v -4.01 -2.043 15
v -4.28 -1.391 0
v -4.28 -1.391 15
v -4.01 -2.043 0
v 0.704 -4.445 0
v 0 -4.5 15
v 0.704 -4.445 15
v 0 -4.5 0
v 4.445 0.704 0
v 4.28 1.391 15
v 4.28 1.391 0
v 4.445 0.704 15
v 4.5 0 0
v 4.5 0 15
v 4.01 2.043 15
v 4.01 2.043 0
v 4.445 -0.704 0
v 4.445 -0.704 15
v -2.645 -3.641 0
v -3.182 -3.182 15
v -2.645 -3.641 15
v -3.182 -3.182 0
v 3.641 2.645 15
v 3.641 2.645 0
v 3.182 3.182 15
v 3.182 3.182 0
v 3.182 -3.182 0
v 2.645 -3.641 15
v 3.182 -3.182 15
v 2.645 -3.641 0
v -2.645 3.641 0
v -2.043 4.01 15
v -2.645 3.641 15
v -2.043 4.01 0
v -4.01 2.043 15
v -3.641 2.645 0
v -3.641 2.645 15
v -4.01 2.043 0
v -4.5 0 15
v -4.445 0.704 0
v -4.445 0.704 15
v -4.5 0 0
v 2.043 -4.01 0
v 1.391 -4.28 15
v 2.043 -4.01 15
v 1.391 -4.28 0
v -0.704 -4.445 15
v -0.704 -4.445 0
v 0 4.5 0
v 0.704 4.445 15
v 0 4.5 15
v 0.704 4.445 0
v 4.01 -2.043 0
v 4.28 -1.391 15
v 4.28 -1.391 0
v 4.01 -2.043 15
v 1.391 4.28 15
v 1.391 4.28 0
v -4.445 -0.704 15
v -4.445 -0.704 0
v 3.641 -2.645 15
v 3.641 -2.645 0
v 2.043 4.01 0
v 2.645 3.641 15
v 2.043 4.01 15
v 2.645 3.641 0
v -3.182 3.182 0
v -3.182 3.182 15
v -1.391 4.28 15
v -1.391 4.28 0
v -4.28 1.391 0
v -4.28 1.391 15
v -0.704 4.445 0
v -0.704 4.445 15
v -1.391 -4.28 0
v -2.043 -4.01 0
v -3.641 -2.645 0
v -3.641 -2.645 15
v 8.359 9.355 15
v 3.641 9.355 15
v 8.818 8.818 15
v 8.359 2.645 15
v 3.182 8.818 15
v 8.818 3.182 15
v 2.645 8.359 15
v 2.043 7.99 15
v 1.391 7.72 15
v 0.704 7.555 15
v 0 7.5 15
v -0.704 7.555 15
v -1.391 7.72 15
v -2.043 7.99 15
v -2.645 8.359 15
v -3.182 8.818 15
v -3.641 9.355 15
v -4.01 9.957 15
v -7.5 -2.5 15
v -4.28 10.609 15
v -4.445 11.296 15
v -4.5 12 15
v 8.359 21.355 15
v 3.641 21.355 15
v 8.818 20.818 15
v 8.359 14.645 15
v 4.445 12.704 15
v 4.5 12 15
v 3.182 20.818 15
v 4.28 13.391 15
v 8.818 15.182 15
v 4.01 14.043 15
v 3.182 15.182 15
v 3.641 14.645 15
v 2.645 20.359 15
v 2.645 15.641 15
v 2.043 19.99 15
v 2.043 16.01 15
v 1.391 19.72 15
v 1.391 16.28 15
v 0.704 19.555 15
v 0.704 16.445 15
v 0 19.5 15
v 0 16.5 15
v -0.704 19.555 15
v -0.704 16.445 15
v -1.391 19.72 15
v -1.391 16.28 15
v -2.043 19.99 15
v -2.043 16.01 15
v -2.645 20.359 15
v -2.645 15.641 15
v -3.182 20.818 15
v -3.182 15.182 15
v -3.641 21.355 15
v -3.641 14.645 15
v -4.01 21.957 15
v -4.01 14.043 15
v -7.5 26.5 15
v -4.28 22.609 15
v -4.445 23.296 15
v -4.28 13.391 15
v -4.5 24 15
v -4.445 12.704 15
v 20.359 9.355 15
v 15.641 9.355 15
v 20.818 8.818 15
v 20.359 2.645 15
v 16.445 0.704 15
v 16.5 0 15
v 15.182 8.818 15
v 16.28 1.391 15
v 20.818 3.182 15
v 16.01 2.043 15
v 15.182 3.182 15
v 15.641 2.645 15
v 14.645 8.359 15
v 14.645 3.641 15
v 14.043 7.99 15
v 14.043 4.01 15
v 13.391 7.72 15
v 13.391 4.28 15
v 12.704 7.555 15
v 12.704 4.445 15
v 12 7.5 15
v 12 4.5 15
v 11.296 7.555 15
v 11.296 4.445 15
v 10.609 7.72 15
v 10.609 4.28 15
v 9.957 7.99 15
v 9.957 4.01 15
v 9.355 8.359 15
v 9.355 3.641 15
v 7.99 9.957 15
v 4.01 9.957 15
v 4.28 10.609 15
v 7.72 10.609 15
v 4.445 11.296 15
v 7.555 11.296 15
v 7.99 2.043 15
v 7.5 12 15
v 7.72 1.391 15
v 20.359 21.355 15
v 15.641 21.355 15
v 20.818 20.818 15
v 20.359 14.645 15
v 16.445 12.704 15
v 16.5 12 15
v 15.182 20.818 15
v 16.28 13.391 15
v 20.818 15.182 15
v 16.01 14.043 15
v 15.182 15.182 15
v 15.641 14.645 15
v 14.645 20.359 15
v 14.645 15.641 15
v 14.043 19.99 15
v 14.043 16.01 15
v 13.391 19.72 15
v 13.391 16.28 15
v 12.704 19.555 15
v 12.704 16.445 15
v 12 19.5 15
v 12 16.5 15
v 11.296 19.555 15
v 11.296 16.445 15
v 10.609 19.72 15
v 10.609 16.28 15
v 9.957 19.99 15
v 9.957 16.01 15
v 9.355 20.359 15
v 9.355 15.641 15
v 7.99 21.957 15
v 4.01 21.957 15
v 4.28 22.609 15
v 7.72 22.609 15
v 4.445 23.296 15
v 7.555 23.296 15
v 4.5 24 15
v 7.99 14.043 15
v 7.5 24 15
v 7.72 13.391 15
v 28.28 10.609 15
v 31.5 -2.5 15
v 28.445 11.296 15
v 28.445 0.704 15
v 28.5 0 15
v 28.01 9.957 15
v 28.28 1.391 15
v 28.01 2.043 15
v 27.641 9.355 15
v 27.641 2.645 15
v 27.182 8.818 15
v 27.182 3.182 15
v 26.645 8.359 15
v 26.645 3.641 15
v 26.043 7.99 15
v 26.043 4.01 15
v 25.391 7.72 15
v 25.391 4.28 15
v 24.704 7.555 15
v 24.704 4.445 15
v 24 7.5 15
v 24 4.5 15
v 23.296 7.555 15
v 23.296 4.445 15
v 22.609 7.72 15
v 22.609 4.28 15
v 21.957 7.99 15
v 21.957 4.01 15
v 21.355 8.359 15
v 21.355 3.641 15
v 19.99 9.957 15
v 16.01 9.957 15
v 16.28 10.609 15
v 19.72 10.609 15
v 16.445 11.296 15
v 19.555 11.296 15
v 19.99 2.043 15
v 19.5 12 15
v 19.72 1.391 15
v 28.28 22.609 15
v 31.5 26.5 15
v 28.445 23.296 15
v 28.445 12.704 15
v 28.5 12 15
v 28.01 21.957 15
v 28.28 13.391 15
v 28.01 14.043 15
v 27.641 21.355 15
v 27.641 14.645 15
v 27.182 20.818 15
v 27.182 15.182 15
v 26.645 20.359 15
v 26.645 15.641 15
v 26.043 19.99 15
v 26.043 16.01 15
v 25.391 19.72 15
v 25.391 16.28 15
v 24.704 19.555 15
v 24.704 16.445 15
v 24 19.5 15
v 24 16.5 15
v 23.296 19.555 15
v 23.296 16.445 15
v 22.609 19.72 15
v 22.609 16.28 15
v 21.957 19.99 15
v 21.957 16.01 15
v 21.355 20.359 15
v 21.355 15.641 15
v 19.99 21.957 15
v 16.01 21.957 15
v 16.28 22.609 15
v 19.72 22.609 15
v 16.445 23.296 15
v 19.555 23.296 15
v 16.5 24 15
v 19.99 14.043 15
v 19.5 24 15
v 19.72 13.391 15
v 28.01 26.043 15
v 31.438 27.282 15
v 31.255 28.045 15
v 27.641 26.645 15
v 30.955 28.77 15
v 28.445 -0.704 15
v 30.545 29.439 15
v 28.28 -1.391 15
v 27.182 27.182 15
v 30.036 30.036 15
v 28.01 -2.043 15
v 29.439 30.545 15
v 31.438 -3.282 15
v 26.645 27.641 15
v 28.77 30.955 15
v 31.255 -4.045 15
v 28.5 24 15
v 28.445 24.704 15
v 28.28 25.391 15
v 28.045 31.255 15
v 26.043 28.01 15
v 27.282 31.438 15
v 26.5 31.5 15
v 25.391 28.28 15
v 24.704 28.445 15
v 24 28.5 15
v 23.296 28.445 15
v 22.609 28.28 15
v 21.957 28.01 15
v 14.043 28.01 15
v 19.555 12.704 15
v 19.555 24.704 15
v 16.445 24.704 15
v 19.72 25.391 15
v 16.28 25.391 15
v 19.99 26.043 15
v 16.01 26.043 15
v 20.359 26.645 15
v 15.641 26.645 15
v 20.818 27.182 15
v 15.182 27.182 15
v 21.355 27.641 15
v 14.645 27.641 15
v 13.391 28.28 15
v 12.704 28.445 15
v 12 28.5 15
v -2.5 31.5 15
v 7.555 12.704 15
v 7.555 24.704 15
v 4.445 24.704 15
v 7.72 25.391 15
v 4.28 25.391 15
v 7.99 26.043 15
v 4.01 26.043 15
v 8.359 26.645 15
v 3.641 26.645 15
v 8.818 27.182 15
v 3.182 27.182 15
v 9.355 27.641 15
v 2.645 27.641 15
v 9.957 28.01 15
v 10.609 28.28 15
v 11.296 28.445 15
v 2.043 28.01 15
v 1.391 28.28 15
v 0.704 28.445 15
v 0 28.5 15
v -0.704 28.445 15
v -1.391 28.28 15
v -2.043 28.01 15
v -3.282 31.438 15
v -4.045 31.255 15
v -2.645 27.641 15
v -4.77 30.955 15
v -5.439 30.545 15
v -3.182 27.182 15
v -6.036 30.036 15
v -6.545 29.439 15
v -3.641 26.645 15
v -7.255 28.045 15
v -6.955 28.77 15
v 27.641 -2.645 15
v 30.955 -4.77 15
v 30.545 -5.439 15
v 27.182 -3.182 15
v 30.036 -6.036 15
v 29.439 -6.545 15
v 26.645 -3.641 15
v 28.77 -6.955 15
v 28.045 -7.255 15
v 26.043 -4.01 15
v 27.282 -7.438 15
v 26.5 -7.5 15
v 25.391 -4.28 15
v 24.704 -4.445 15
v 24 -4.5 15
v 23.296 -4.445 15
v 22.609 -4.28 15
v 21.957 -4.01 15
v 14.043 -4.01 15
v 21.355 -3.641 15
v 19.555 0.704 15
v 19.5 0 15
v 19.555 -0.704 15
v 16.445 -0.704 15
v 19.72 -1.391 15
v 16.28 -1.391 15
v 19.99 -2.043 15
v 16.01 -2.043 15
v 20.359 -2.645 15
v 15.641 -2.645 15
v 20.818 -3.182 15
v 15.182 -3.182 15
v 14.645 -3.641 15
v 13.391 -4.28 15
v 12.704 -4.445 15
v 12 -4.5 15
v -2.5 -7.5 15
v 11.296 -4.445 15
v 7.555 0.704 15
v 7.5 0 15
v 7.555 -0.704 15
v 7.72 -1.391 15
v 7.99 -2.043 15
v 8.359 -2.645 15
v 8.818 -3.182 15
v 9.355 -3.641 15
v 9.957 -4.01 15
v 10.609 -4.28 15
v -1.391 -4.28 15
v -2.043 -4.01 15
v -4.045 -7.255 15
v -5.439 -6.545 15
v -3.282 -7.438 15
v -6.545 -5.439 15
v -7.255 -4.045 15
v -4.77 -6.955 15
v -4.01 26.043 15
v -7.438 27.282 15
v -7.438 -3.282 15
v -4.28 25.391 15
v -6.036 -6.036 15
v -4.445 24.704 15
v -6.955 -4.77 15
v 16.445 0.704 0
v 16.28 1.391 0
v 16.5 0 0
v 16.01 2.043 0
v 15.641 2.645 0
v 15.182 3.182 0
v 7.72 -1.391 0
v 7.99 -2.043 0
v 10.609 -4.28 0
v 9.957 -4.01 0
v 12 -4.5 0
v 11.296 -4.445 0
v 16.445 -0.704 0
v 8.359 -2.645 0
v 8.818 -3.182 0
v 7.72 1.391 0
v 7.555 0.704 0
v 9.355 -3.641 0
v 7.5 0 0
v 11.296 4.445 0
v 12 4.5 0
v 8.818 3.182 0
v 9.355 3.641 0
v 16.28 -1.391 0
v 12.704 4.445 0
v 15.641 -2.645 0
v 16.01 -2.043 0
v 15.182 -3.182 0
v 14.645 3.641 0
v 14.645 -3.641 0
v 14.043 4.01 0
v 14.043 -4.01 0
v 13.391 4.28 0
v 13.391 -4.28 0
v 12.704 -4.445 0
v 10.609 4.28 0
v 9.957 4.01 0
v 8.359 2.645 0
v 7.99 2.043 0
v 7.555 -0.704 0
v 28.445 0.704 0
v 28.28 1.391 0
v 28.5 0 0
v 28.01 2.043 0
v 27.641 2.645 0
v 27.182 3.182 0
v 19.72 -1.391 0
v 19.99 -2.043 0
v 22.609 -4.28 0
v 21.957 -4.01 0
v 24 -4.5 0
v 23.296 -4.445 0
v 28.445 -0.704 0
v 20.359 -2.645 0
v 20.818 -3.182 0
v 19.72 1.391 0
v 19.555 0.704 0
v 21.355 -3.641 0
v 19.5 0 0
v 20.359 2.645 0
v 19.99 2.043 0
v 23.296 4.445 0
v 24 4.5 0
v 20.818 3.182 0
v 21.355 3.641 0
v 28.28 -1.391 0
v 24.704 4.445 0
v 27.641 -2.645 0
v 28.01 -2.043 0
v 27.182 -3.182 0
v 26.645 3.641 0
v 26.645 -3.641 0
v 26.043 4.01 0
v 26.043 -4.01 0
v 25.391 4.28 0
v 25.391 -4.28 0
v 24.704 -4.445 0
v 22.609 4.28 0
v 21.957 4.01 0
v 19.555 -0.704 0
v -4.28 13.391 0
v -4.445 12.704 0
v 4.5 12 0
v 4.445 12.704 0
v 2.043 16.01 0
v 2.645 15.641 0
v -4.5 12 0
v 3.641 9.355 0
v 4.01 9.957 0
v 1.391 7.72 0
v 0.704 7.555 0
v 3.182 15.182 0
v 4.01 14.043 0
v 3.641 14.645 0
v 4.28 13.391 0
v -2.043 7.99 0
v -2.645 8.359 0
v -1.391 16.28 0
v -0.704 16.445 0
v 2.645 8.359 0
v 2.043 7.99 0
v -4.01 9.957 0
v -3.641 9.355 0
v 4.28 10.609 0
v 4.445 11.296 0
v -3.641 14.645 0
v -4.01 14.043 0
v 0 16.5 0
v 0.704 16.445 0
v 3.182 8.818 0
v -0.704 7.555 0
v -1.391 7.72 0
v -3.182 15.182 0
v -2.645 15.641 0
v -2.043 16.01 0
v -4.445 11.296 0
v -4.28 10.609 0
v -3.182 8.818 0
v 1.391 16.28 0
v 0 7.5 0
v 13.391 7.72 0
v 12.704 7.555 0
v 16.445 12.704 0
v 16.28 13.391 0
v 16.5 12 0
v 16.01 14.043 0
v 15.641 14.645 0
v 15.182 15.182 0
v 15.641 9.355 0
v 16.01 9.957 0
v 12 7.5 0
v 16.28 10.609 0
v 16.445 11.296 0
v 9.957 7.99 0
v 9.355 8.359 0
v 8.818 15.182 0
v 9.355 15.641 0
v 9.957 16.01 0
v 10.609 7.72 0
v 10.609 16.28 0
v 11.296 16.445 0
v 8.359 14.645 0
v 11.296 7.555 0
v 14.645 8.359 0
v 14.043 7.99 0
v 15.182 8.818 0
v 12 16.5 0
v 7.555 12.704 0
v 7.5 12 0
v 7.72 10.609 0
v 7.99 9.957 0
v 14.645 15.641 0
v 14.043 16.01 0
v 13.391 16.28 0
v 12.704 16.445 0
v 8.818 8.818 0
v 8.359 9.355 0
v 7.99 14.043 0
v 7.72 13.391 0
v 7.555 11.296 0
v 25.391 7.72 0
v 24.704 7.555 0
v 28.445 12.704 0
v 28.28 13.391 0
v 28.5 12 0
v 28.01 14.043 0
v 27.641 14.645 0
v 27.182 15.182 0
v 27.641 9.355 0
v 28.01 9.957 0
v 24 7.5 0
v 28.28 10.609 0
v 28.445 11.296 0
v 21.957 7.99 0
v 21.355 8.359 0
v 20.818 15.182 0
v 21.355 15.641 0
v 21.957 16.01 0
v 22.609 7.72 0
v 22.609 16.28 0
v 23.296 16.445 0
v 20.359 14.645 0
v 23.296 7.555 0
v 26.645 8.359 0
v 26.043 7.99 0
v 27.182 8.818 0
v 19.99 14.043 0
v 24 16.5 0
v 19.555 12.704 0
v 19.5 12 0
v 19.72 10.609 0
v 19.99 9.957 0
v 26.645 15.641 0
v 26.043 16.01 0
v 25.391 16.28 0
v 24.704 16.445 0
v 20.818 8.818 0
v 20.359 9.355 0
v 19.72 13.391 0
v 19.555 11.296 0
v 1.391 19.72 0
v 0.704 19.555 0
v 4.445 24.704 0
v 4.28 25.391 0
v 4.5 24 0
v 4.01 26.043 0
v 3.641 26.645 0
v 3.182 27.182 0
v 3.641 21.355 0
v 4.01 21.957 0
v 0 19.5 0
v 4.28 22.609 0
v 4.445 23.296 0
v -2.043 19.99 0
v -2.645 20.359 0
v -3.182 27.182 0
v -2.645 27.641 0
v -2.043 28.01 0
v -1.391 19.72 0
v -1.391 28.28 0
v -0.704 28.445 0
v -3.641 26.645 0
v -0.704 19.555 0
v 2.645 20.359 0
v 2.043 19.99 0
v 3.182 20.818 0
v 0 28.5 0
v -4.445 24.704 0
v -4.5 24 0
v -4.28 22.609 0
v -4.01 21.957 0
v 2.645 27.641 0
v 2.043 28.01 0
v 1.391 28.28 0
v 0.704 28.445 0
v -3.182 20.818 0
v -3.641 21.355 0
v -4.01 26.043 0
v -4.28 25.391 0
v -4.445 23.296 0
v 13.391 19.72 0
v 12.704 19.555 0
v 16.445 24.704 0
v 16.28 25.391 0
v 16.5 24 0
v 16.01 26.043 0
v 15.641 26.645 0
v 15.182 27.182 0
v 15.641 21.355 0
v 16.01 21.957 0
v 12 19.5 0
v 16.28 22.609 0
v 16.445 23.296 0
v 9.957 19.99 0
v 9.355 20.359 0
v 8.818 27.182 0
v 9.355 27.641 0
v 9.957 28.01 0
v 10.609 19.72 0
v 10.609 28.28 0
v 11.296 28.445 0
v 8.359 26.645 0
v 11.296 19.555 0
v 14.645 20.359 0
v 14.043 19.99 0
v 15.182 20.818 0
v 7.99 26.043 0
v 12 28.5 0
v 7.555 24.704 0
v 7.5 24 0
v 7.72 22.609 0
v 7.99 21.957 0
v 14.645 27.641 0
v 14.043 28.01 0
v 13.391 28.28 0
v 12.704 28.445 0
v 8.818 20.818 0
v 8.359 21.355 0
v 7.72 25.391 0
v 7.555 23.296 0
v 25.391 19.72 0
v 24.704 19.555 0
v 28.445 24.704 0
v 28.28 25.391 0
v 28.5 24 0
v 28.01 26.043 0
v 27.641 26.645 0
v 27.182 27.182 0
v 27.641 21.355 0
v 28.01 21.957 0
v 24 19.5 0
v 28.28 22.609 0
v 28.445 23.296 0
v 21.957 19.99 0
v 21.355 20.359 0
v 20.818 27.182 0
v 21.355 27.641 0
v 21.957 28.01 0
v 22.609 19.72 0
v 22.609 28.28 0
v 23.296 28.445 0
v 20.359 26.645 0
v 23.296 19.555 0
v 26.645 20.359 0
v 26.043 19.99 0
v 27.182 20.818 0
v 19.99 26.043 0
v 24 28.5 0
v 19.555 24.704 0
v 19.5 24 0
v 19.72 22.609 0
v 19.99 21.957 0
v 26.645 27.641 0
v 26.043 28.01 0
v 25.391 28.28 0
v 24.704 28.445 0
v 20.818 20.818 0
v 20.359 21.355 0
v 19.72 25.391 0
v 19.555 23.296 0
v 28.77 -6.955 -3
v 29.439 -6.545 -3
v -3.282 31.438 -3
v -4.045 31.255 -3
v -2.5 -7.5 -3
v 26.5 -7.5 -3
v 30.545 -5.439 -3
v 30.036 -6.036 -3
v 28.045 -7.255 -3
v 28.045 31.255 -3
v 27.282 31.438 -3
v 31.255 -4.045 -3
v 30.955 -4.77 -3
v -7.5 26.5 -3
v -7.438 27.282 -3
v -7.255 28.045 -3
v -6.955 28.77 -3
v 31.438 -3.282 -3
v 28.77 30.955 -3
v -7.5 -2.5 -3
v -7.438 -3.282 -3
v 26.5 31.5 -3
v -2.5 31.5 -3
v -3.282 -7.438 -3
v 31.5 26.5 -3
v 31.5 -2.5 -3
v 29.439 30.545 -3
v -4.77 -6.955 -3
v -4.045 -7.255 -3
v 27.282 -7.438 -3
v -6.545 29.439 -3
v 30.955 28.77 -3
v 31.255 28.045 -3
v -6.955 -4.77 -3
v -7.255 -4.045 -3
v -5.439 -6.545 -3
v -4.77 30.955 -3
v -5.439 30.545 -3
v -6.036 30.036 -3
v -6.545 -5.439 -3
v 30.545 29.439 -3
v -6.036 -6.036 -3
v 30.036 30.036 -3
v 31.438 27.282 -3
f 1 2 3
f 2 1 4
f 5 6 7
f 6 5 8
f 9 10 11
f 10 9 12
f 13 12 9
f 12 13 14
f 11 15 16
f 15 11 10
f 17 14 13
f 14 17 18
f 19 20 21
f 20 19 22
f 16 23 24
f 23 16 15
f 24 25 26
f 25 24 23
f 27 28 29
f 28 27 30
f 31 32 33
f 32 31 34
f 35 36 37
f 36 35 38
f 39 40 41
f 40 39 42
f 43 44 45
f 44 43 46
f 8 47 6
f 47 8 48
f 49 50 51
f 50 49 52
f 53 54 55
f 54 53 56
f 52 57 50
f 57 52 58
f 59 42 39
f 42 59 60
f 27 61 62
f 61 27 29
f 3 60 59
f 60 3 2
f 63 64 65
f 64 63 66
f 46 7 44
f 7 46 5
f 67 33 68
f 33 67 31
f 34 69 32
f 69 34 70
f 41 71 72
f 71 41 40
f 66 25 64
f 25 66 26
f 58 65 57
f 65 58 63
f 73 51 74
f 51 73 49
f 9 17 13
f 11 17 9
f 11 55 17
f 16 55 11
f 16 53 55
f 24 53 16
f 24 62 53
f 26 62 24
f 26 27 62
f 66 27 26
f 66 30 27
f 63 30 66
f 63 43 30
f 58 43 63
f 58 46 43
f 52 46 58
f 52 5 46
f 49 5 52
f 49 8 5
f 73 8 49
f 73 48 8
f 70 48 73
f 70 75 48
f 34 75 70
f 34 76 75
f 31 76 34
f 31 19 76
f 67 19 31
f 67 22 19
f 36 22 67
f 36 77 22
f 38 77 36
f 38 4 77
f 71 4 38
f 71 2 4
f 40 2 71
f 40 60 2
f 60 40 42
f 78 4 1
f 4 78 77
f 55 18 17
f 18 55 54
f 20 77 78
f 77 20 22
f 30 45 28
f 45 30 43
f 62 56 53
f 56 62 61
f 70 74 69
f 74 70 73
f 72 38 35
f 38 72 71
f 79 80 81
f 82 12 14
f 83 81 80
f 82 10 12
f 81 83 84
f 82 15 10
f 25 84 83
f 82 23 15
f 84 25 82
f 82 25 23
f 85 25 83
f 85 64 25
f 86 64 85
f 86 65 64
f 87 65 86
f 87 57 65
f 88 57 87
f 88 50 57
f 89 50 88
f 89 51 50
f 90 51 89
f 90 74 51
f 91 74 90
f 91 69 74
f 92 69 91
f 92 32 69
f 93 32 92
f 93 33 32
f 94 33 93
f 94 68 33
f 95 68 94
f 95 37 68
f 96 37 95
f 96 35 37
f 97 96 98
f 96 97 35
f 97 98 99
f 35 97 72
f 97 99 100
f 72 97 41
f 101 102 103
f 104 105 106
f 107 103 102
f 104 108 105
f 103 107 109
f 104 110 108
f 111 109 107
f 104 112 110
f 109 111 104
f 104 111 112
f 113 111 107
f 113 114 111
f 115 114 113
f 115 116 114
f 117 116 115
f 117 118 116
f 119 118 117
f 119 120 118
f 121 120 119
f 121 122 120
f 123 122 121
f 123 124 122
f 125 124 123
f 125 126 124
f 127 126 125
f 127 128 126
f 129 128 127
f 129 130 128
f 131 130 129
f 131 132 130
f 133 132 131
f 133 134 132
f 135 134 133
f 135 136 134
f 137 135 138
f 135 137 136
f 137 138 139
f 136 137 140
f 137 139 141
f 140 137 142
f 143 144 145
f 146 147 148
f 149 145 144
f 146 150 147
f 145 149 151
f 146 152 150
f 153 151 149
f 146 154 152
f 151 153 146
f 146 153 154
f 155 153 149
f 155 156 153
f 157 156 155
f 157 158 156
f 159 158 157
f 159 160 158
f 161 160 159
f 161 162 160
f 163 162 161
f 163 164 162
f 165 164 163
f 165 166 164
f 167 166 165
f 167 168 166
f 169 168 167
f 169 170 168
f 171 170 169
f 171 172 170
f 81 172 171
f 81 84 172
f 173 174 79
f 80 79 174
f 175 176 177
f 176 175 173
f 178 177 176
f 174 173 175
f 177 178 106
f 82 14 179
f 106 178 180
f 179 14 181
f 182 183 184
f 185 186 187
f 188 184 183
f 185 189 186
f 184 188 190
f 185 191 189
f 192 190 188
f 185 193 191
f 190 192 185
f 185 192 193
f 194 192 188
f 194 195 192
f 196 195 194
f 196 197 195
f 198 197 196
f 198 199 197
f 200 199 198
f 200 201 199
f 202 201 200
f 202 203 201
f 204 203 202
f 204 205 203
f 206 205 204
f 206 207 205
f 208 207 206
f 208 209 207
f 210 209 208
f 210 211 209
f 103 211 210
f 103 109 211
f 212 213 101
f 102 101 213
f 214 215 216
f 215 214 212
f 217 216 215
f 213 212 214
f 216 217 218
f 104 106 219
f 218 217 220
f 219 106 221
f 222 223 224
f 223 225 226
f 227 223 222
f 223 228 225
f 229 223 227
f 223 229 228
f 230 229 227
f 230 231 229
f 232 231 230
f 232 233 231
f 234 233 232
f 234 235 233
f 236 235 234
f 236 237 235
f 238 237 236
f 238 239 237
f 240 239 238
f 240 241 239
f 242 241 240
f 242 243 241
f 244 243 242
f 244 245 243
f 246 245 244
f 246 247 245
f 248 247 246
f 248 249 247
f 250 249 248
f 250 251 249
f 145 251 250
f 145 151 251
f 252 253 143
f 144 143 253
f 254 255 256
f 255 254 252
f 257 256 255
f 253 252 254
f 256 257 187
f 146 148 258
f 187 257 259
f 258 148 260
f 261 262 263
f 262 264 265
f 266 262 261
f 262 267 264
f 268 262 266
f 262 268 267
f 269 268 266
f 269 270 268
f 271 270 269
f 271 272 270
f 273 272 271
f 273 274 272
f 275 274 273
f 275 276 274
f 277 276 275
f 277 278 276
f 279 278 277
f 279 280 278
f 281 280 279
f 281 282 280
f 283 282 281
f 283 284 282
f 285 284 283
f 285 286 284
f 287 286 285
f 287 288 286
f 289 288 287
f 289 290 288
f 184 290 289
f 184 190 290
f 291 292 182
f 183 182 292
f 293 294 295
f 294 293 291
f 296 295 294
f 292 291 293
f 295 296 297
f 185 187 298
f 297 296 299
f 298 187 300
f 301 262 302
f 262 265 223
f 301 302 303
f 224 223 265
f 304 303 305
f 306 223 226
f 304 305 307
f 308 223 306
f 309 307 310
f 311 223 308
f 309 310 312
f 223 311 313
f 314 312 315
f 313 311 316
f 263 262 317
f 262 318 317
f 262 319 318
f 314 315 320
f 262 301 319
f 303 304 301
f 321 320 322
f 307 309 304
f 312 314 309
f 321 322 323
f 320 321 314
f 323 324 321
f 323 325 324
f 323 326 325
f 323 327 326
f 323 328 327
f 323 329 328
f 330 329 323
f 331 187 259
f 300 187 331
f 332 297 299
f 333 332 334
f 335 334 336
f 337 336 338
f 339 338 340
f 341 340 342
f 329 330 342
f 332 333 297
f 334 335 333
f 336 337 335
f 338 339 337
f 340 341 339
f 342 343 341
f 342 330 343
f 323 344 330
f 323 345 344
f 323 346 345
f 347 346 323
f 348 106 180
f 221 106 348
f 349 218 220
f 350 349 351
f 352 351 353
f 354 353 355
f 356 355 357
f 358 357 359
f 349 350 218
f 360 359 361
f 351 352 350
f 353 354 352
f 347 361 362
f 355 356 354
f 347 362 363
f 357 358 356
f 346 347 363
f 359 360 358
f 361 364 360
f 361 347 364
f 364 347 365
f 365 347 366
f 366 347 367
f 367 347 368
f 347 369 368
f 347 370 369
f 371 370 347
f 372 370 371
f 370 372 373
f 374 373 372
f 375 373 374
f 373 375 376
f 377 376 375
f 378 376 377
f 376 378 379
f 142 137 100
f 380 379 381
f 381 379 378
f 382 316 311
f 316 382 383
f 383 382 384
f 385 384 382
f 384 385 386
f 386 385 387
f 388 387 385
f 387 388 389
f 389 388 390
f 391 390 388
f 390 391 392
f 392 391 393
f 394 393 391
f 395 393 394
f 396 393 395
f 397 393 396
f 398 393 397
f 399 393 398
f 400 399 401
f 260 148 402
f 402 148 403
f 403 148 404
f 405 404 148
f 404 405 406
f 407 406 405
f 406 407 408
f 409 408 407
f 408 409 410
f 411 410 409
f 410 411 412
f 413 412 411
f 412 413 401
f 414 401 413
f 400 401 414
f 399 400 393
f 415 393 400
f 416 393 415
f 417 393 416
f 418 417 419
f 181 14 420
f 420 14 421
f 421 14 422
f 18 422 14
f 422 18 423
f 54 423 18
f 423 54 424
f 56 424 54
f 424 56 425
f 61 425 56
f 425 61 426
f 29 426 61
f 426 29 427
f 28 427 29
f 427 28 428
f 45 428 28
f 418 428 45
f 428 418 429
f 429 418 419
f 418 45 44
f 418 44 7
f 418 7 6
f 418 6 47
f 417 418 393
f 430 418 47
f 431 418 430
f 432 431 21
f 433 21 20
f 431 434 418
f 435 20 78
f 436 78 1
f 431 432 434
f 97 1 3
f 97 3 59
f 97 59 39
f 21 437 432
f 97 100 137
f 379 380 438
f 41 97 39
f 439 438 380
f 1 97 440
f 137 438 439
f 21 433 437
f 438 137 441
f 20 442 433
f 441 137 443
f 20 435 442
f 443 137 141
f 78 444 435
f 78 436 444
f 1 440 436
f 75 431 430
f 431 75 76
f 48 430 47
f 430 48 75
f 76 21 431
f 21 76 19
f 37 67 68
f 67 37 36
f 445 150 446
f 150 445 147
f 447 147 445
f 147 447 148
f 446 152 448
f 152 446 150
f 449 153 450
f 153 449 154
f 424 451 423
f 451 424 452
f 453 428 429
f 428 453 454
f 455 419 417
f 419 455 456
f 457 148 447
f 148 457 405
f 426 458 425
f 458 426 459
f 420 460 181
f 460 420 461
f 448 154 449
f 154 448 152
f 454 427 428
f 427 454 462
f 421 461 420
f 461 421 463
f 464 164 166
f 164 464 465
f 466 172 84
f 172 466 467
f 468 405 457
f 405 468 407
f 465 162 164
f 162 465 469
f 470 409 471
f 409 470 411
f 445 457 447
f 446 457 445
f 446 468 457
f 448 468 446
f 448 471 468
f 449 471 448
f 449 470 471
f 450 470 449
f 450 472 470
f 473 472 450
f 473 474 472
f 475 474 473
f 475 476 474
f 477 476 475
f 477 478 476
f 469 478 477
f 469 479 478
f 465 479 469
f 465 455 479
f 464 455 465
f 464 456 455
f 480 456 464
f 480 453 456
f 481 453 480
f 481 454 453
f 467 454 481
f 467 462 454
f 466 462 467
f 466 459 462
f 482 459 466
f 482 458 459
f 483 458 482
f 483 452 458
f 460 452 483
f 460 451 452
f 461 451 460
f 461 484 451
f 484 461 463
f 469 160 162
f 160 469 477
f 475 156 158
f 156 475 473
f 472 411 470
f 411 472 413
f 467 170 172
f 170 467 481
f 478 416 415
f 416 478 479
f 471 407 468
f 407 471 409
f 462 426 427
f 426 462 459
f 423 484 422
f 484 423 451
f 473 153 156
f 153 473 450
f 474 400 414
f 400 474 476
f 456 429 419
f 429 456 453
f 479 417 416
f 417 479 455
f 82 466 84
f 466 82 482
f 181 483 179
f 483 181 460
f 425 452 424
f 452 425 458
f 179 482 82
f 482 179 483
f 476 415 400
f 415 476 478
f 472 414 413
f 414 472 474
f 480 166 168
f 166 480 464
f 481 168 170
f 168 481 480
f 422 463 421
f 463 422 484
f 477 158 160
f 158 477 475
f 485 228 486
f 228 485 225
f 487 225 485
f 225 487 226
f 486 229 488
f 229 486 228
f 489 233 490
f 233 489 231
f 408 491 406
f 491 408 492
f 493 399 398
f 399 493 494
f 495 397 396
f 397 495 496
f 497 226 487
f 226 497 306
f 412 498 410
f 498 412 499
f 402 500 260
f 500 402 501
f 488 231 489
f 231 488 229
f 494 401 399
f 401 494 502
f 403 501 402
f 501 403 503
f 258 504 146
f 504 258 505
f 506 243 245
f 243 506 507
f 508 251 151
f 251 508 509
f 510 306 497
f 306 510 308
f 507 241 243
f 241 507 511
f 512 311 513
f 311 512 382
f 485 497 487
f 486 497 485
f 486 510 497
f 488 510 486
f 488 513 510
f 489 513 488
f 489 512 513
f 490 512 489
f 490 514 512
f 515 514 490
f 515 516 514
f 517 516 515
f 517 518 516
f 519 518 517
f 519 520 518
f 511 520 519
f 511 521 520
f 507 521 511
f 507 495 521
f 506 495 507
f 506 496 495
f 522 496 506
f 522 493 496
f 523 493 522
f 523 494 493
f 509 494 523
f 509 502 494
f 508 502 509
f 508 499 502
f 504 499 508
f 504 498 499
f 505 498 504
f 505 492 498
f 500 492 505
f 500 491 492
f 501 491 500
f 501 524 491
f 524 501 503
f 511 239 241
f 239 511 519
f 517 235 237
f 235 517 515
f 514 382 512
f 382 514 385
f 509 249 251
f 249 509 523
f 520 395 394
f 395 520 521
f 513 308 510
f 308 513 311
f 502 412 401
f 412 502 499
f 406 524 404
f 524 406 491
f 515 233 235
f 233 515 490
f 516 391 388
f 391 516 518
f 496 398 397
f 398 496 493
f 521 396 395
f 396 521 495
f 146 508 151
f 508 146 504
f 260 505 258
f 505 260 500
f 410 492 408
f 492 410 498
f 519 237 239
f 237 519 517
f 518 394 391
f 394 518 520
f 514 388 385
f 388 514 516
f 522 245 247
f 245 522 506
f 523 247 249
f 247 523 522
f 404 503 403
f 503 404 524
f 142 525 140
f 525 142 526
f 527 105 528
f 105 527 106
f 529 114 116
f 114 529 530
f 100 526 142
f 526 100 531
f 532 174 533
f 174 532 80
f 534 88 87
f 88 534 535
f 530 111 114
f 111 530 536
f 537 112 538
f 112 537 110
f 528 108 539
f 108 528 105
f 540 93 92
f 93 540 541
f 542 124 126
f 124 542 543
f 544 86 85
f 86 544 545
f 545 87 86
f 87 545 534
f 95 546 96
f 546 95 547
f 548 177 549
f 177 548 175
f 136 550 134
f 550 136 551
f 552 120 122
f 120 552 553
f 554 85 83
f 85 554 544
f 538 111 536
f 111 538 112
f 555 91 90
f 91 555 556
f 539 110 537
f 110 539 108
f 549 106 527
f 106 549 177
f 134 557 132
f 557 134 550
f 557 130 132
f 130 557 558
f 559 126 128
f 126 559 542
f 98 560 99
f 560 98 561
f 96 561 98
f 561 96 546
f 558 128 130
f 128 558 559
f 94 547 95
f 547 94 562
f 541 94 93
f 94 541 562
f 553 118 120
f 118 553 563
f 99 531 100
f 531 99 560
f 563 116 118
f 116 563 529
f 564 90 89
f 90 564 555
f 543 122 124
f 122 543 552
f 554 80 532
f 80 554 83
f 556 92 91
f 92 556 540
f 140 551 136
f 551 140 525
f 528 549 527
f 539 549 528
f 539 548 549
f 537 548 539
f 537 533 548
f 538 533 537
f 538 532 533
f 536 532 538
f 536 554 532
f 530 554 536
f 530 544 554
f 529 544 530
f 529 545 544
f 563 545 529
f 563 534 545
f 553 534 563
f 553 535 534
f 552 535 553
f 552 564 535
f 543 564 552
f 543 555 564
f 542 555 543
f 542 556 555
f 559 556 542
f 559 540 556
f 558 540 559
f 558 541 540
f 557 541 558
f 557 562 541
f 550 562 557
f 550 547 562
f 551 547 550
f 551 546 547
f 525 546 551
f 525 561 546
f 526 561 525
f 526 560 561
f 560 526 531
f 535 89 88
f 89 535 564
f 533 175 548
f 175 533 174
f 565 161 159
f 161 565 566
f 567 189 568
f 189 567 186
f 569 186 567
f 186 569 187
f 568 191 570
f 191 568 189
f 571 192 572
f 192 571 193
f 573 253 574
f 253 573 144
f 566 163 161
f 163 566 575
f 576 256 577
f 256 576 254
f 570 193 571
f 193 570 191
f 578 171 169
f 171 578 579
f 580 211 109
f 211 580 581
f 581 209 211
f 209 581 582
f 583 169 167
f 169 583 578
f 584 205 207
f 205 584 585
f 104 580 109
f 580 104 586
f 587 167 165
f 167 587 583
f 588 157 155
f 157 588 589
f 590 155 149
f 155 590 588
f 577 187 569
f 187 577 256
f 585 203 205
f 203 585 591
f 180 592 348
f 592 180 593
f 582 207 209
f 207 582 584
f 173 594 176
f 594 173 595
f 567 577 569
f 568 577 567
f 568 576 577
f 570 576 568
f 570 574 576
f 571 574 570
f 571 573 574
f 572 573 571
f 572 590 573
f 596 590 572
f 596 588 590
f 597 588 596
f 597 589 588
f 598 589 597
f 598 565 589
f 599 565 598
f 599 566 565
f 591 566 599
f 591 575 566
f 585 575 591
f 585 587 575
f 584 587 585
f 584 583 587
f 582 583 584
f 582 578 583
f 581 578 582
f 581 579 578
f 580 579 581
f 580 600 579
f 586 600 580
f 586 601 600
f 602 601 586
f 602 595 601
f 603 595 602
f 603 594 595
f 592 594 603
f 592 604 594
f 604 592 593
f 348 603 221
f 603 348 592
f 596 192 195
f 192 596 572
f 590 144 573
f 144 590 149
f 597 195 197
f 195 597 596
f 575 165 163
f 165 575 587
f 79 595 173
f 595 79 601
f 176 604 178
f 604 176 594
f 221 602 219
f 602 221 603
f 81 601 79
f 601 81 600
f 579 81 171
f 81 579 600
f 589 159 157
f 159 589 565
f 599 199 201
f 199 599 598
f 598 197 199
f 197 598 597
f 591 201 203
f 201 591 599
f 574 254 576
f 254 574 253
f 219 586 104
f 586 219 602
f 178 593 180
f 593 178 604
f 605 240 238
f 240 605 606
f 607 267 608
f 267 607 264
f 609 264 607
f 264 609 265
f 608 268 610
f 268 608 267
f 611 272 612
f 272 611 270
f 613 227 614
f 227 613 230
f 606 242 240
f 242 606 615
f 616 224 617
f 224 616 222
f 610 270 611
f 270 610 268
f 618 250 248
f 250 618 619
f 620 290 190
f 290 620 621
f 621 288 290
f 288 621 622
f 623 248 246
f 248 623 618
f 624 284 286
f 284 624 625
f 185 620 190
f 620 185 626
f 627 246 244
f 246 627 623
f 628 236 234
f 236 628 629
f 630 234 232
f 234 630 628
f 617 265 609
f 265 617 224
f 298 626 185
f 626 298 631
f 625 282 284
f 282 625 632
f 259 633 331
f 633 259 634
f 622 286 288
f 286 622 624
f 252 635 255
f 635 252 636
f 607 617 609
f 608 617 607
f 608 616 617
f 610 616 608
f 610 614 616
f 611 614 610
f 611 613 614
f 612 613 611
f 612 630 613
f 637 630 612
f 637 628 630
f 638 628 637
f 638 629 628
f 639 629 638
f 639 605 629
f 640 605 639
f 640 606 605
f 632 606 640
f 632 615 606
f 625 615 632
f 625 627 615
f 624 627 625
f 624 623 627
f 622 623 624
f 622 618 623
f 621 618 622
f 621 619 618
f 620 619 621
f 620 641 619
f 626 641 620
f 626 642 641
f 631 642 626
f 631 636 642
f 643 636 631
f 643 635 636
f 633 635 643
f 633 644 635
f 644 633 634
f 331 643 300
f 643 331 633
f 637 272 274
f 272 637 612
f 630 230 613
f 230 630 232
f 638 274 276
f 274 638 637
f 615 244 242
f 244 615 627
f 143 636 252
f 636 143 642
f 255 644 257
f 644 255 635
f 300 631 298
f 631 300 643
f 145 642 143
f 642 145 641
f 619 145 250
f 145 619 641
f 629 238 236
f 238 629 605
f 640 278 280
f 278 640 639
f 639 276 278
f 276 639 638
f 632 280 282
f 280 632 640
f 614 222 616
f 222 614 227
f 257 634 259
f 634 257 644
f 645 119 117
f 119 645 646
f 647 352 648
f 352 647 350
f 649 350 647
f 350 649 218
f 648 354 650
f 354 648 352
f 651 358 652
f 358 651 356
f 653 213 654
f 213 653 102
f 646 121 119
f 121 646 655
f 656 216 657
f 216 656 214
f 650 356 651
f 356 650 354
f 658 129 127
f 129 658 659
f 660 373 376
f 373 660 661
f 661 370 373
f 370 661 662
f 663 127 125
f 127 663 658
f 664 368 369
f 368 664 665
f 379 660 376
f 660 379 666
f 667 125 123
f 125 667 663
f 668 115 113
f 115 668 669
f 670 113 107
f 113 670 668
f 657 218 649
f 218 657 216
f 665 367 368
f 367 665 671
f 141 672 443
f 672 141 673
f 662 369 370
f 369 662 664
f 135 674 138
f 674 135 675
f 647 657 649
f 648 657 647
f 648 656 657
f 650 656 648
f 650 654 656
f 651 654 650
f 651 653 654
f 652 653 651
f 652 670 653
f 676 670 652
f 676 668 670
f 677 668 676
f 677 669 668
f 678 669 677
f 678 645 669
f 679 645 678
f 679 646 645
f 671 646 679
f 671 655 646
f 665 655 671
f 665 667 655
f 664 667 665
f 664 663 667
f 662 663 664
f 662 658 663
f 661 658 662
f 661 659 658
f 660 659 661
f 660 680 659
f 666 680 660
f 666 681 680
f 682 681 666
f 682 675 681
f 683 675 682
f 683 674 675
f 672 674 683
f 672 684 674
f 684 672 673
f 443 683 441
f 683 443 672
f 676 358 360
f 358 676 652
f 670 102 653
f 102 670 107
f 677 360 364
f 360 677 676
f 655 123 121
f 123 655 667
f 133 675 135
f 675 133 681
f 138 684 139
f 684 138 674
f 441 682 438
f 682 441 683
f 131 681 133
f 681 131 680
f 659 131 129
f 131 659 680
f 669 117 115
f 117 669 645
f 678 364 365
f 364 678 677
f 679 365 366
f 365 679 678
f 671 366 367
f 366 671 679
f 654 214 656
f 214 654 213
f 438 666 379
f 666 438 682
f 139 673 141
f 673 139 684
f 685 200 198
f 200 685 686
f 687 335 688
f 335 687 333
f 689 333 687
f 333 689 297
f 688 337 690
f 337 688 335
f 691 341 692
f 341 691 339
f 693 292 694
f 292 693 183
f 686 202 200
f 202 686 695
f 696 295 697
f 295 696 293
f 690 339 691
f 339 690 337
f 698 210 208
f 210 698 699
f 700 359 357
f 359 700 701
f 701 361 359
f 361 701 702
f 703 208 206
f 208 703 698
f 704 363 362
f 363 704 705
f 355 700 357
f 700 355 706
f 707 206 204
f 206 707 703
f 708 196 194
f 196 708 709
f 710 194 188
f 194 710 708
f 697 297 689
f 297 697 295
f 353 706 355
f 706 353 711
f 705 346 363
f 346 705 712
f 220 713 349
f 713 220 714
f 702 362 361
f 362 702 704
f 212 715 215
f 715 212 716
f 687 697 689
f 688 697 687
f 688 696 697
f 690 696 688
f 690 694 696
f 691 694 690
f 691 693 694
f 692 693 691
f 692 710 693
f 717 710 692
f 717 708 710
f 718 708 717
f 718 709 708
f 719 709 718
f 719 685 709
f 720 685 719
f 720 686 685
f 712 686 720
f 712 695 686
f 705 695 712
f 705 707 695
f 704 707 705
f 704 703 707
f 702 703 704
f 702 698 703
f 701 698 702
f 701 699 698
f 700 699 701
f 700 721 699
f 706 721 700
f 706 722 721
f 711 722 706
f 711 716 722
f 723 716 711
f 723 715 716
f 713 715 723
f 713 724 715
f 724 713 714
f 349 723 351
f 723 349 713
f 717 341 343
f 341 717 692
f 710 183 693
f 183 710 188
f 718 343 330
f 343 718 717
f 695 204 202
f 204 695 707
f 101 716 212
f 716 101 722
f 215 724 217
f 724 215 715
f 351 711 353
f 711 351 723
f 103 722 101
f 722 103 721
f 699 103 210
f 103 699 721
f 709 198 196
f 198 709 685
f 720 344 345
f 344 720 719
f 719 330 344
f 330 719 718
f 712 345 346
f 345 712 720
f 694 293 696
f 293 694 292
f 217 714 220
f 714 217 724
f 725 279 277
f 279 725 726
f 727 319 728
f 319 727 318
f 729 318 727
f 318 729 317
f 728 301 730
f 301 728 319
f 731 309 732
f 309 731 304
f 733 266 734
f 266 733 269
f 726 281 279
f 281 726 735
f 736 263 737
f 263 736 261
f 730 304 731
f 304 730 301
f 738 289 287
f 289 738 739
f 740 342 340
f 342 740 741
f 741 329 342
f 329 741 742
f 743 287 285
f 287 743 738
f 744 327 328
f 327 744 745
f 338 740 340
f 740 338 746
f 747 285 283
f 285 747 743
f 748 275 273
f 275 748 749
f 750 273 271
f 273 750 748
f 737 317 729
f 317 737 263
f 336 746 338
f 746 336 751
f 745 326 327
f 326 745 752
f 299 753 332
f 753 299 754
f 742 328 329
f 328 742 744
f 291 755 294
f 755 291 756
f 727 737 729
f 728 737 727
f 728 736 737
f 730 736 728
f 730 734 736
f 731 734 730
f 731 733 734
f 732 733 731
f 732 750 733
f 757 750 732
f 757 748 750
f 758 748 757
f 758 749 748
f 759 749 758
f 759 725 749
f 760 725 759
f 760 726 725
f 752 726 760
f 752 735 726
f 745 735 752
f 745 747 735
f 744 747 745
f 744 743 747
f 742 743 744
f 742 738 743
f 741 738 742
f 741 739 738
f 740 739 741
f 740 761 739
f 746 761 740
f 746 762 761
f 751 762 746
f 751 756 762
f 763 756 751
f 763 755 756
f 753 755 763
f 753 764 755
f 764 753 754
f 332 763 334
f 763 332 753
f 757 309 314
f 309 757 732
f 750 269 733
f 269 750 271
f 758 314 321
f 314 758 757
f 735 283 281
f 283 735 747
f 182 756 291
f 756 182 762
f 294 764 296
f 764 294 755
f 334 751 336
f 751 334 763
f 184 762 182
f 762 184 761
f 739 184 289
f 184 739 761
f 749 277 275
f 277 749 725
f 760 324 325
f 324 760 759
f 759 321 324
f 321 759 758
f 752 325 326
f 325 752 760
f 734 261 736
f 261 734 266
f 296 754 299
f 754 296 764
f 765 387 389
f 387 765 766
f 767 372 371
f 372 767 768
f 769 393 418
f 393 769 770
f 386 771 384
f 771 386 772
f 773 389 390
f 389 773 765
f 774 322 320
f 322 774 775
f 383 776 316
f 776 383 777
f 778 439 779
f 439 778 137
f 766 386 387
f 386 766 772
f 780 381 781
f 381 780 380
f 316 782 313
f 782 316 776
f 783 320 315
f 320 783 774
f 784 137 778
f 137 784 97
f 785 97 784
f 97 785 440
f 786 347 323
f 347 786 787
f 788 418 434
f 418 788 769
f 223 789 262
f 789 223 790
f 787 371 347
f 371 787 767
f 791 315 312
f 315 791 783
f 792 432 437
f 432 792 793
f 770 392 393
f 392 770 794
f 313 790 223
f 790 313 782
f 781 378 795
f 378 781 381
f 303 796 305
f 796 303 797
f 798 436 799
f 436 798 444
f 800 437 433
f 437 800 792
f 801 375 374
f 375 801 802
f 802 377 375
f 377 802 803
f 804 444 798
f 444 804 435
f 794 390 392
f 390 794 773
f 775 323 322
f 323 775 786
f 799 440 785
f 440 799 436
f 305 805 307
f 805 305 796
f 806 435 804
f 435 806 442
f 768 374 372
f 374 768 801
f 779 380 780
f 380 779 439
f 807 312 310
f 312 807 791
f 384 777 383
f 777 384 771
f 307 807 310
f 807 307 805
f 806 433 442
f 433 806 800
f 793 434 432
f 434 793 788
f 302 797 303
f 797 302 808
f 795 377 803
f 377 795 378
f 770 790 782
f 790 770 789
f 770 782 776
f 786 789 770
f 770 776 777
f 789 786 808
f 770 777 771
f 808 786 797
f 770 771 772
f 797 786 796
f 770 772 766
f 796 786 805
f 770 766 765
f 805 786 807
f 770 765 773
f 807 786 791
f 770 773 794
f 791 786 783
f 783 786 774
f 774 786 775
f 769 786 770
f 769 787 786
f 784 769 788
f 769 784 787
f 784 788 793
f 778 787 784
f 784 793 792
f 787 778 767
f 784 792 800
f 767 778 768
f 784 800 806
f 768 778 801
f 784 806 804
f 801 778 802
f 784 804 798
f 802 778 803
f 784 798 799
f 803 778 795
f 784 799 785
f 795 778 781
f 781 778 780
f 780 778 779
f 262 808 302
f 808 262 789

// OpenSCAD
/*
Solder Tip Holder (c) by Jorge Monteiro

Solder Tip Holder is licensed under a
Creative Commons Attribution-ShareAlike 4.0 International.

You should have received a copy of the license along with this
work.  If not, see <http://creativecommons.org/licenses/by-sa/4.0/>.
*/

/* [Basics] */
// Space between tips in mm
tipGap = 3;
// Diameter of tip in mm
tipSize = 9;
// Number of tips you want to store per row
tipsPerRow = 3;
// Number of tips you want to store per column
tipsPerColumn = 3;
// Height of the tip box in mm
height = 18;
// Base of the box in mm
baseHeight = 3;

/* [Ignore] */
$fn=40*1;
tipDim = tipSize/2;
width = tipsPerRow * (tipGap + tipSize) + tipGap;
length = tipsPerColumn * (tipGap + tipSize) + tipGap;
tipHeight = height - baseHeight;

difference() {
    
    translate([length/2-(tipGap+tipDim), width/2-(tipGap+tipDim), -3]) roundedCube(length, width, height, 5);
    drawTipHolders();
};

module drawTipHolders() {
     for(row = [0 : 1 : tipsPerRow-1]) {
         for(column = [0 : 1 : tipsPerColumn-1]) {
            translate([(tipGap+tipDim*2)*column, (tipGap+tipDim*2)*row]) cylinder(tipHeight, tipDim, tipDim);
         }
     }

}

module roundedCube(xdim, ydim, zdim, rdim) {
    translate([-xdim/2,-ydim/2,0]){
        hull(){
            translate([rdim,rdim,0]) cylinder(r=rdim, h=zdim);
            translate([xdim-rdim,rdim,0]) cylinder(r=rdim, h=zdim);

            translate([rdim,ydim-rdim,0]) cylinder(r=rdim, h=zdim);
            translate([xdim-rdim,ydim-rdim,0]) cylinder(r=rdim, h=zdim);

        };
    };
};

